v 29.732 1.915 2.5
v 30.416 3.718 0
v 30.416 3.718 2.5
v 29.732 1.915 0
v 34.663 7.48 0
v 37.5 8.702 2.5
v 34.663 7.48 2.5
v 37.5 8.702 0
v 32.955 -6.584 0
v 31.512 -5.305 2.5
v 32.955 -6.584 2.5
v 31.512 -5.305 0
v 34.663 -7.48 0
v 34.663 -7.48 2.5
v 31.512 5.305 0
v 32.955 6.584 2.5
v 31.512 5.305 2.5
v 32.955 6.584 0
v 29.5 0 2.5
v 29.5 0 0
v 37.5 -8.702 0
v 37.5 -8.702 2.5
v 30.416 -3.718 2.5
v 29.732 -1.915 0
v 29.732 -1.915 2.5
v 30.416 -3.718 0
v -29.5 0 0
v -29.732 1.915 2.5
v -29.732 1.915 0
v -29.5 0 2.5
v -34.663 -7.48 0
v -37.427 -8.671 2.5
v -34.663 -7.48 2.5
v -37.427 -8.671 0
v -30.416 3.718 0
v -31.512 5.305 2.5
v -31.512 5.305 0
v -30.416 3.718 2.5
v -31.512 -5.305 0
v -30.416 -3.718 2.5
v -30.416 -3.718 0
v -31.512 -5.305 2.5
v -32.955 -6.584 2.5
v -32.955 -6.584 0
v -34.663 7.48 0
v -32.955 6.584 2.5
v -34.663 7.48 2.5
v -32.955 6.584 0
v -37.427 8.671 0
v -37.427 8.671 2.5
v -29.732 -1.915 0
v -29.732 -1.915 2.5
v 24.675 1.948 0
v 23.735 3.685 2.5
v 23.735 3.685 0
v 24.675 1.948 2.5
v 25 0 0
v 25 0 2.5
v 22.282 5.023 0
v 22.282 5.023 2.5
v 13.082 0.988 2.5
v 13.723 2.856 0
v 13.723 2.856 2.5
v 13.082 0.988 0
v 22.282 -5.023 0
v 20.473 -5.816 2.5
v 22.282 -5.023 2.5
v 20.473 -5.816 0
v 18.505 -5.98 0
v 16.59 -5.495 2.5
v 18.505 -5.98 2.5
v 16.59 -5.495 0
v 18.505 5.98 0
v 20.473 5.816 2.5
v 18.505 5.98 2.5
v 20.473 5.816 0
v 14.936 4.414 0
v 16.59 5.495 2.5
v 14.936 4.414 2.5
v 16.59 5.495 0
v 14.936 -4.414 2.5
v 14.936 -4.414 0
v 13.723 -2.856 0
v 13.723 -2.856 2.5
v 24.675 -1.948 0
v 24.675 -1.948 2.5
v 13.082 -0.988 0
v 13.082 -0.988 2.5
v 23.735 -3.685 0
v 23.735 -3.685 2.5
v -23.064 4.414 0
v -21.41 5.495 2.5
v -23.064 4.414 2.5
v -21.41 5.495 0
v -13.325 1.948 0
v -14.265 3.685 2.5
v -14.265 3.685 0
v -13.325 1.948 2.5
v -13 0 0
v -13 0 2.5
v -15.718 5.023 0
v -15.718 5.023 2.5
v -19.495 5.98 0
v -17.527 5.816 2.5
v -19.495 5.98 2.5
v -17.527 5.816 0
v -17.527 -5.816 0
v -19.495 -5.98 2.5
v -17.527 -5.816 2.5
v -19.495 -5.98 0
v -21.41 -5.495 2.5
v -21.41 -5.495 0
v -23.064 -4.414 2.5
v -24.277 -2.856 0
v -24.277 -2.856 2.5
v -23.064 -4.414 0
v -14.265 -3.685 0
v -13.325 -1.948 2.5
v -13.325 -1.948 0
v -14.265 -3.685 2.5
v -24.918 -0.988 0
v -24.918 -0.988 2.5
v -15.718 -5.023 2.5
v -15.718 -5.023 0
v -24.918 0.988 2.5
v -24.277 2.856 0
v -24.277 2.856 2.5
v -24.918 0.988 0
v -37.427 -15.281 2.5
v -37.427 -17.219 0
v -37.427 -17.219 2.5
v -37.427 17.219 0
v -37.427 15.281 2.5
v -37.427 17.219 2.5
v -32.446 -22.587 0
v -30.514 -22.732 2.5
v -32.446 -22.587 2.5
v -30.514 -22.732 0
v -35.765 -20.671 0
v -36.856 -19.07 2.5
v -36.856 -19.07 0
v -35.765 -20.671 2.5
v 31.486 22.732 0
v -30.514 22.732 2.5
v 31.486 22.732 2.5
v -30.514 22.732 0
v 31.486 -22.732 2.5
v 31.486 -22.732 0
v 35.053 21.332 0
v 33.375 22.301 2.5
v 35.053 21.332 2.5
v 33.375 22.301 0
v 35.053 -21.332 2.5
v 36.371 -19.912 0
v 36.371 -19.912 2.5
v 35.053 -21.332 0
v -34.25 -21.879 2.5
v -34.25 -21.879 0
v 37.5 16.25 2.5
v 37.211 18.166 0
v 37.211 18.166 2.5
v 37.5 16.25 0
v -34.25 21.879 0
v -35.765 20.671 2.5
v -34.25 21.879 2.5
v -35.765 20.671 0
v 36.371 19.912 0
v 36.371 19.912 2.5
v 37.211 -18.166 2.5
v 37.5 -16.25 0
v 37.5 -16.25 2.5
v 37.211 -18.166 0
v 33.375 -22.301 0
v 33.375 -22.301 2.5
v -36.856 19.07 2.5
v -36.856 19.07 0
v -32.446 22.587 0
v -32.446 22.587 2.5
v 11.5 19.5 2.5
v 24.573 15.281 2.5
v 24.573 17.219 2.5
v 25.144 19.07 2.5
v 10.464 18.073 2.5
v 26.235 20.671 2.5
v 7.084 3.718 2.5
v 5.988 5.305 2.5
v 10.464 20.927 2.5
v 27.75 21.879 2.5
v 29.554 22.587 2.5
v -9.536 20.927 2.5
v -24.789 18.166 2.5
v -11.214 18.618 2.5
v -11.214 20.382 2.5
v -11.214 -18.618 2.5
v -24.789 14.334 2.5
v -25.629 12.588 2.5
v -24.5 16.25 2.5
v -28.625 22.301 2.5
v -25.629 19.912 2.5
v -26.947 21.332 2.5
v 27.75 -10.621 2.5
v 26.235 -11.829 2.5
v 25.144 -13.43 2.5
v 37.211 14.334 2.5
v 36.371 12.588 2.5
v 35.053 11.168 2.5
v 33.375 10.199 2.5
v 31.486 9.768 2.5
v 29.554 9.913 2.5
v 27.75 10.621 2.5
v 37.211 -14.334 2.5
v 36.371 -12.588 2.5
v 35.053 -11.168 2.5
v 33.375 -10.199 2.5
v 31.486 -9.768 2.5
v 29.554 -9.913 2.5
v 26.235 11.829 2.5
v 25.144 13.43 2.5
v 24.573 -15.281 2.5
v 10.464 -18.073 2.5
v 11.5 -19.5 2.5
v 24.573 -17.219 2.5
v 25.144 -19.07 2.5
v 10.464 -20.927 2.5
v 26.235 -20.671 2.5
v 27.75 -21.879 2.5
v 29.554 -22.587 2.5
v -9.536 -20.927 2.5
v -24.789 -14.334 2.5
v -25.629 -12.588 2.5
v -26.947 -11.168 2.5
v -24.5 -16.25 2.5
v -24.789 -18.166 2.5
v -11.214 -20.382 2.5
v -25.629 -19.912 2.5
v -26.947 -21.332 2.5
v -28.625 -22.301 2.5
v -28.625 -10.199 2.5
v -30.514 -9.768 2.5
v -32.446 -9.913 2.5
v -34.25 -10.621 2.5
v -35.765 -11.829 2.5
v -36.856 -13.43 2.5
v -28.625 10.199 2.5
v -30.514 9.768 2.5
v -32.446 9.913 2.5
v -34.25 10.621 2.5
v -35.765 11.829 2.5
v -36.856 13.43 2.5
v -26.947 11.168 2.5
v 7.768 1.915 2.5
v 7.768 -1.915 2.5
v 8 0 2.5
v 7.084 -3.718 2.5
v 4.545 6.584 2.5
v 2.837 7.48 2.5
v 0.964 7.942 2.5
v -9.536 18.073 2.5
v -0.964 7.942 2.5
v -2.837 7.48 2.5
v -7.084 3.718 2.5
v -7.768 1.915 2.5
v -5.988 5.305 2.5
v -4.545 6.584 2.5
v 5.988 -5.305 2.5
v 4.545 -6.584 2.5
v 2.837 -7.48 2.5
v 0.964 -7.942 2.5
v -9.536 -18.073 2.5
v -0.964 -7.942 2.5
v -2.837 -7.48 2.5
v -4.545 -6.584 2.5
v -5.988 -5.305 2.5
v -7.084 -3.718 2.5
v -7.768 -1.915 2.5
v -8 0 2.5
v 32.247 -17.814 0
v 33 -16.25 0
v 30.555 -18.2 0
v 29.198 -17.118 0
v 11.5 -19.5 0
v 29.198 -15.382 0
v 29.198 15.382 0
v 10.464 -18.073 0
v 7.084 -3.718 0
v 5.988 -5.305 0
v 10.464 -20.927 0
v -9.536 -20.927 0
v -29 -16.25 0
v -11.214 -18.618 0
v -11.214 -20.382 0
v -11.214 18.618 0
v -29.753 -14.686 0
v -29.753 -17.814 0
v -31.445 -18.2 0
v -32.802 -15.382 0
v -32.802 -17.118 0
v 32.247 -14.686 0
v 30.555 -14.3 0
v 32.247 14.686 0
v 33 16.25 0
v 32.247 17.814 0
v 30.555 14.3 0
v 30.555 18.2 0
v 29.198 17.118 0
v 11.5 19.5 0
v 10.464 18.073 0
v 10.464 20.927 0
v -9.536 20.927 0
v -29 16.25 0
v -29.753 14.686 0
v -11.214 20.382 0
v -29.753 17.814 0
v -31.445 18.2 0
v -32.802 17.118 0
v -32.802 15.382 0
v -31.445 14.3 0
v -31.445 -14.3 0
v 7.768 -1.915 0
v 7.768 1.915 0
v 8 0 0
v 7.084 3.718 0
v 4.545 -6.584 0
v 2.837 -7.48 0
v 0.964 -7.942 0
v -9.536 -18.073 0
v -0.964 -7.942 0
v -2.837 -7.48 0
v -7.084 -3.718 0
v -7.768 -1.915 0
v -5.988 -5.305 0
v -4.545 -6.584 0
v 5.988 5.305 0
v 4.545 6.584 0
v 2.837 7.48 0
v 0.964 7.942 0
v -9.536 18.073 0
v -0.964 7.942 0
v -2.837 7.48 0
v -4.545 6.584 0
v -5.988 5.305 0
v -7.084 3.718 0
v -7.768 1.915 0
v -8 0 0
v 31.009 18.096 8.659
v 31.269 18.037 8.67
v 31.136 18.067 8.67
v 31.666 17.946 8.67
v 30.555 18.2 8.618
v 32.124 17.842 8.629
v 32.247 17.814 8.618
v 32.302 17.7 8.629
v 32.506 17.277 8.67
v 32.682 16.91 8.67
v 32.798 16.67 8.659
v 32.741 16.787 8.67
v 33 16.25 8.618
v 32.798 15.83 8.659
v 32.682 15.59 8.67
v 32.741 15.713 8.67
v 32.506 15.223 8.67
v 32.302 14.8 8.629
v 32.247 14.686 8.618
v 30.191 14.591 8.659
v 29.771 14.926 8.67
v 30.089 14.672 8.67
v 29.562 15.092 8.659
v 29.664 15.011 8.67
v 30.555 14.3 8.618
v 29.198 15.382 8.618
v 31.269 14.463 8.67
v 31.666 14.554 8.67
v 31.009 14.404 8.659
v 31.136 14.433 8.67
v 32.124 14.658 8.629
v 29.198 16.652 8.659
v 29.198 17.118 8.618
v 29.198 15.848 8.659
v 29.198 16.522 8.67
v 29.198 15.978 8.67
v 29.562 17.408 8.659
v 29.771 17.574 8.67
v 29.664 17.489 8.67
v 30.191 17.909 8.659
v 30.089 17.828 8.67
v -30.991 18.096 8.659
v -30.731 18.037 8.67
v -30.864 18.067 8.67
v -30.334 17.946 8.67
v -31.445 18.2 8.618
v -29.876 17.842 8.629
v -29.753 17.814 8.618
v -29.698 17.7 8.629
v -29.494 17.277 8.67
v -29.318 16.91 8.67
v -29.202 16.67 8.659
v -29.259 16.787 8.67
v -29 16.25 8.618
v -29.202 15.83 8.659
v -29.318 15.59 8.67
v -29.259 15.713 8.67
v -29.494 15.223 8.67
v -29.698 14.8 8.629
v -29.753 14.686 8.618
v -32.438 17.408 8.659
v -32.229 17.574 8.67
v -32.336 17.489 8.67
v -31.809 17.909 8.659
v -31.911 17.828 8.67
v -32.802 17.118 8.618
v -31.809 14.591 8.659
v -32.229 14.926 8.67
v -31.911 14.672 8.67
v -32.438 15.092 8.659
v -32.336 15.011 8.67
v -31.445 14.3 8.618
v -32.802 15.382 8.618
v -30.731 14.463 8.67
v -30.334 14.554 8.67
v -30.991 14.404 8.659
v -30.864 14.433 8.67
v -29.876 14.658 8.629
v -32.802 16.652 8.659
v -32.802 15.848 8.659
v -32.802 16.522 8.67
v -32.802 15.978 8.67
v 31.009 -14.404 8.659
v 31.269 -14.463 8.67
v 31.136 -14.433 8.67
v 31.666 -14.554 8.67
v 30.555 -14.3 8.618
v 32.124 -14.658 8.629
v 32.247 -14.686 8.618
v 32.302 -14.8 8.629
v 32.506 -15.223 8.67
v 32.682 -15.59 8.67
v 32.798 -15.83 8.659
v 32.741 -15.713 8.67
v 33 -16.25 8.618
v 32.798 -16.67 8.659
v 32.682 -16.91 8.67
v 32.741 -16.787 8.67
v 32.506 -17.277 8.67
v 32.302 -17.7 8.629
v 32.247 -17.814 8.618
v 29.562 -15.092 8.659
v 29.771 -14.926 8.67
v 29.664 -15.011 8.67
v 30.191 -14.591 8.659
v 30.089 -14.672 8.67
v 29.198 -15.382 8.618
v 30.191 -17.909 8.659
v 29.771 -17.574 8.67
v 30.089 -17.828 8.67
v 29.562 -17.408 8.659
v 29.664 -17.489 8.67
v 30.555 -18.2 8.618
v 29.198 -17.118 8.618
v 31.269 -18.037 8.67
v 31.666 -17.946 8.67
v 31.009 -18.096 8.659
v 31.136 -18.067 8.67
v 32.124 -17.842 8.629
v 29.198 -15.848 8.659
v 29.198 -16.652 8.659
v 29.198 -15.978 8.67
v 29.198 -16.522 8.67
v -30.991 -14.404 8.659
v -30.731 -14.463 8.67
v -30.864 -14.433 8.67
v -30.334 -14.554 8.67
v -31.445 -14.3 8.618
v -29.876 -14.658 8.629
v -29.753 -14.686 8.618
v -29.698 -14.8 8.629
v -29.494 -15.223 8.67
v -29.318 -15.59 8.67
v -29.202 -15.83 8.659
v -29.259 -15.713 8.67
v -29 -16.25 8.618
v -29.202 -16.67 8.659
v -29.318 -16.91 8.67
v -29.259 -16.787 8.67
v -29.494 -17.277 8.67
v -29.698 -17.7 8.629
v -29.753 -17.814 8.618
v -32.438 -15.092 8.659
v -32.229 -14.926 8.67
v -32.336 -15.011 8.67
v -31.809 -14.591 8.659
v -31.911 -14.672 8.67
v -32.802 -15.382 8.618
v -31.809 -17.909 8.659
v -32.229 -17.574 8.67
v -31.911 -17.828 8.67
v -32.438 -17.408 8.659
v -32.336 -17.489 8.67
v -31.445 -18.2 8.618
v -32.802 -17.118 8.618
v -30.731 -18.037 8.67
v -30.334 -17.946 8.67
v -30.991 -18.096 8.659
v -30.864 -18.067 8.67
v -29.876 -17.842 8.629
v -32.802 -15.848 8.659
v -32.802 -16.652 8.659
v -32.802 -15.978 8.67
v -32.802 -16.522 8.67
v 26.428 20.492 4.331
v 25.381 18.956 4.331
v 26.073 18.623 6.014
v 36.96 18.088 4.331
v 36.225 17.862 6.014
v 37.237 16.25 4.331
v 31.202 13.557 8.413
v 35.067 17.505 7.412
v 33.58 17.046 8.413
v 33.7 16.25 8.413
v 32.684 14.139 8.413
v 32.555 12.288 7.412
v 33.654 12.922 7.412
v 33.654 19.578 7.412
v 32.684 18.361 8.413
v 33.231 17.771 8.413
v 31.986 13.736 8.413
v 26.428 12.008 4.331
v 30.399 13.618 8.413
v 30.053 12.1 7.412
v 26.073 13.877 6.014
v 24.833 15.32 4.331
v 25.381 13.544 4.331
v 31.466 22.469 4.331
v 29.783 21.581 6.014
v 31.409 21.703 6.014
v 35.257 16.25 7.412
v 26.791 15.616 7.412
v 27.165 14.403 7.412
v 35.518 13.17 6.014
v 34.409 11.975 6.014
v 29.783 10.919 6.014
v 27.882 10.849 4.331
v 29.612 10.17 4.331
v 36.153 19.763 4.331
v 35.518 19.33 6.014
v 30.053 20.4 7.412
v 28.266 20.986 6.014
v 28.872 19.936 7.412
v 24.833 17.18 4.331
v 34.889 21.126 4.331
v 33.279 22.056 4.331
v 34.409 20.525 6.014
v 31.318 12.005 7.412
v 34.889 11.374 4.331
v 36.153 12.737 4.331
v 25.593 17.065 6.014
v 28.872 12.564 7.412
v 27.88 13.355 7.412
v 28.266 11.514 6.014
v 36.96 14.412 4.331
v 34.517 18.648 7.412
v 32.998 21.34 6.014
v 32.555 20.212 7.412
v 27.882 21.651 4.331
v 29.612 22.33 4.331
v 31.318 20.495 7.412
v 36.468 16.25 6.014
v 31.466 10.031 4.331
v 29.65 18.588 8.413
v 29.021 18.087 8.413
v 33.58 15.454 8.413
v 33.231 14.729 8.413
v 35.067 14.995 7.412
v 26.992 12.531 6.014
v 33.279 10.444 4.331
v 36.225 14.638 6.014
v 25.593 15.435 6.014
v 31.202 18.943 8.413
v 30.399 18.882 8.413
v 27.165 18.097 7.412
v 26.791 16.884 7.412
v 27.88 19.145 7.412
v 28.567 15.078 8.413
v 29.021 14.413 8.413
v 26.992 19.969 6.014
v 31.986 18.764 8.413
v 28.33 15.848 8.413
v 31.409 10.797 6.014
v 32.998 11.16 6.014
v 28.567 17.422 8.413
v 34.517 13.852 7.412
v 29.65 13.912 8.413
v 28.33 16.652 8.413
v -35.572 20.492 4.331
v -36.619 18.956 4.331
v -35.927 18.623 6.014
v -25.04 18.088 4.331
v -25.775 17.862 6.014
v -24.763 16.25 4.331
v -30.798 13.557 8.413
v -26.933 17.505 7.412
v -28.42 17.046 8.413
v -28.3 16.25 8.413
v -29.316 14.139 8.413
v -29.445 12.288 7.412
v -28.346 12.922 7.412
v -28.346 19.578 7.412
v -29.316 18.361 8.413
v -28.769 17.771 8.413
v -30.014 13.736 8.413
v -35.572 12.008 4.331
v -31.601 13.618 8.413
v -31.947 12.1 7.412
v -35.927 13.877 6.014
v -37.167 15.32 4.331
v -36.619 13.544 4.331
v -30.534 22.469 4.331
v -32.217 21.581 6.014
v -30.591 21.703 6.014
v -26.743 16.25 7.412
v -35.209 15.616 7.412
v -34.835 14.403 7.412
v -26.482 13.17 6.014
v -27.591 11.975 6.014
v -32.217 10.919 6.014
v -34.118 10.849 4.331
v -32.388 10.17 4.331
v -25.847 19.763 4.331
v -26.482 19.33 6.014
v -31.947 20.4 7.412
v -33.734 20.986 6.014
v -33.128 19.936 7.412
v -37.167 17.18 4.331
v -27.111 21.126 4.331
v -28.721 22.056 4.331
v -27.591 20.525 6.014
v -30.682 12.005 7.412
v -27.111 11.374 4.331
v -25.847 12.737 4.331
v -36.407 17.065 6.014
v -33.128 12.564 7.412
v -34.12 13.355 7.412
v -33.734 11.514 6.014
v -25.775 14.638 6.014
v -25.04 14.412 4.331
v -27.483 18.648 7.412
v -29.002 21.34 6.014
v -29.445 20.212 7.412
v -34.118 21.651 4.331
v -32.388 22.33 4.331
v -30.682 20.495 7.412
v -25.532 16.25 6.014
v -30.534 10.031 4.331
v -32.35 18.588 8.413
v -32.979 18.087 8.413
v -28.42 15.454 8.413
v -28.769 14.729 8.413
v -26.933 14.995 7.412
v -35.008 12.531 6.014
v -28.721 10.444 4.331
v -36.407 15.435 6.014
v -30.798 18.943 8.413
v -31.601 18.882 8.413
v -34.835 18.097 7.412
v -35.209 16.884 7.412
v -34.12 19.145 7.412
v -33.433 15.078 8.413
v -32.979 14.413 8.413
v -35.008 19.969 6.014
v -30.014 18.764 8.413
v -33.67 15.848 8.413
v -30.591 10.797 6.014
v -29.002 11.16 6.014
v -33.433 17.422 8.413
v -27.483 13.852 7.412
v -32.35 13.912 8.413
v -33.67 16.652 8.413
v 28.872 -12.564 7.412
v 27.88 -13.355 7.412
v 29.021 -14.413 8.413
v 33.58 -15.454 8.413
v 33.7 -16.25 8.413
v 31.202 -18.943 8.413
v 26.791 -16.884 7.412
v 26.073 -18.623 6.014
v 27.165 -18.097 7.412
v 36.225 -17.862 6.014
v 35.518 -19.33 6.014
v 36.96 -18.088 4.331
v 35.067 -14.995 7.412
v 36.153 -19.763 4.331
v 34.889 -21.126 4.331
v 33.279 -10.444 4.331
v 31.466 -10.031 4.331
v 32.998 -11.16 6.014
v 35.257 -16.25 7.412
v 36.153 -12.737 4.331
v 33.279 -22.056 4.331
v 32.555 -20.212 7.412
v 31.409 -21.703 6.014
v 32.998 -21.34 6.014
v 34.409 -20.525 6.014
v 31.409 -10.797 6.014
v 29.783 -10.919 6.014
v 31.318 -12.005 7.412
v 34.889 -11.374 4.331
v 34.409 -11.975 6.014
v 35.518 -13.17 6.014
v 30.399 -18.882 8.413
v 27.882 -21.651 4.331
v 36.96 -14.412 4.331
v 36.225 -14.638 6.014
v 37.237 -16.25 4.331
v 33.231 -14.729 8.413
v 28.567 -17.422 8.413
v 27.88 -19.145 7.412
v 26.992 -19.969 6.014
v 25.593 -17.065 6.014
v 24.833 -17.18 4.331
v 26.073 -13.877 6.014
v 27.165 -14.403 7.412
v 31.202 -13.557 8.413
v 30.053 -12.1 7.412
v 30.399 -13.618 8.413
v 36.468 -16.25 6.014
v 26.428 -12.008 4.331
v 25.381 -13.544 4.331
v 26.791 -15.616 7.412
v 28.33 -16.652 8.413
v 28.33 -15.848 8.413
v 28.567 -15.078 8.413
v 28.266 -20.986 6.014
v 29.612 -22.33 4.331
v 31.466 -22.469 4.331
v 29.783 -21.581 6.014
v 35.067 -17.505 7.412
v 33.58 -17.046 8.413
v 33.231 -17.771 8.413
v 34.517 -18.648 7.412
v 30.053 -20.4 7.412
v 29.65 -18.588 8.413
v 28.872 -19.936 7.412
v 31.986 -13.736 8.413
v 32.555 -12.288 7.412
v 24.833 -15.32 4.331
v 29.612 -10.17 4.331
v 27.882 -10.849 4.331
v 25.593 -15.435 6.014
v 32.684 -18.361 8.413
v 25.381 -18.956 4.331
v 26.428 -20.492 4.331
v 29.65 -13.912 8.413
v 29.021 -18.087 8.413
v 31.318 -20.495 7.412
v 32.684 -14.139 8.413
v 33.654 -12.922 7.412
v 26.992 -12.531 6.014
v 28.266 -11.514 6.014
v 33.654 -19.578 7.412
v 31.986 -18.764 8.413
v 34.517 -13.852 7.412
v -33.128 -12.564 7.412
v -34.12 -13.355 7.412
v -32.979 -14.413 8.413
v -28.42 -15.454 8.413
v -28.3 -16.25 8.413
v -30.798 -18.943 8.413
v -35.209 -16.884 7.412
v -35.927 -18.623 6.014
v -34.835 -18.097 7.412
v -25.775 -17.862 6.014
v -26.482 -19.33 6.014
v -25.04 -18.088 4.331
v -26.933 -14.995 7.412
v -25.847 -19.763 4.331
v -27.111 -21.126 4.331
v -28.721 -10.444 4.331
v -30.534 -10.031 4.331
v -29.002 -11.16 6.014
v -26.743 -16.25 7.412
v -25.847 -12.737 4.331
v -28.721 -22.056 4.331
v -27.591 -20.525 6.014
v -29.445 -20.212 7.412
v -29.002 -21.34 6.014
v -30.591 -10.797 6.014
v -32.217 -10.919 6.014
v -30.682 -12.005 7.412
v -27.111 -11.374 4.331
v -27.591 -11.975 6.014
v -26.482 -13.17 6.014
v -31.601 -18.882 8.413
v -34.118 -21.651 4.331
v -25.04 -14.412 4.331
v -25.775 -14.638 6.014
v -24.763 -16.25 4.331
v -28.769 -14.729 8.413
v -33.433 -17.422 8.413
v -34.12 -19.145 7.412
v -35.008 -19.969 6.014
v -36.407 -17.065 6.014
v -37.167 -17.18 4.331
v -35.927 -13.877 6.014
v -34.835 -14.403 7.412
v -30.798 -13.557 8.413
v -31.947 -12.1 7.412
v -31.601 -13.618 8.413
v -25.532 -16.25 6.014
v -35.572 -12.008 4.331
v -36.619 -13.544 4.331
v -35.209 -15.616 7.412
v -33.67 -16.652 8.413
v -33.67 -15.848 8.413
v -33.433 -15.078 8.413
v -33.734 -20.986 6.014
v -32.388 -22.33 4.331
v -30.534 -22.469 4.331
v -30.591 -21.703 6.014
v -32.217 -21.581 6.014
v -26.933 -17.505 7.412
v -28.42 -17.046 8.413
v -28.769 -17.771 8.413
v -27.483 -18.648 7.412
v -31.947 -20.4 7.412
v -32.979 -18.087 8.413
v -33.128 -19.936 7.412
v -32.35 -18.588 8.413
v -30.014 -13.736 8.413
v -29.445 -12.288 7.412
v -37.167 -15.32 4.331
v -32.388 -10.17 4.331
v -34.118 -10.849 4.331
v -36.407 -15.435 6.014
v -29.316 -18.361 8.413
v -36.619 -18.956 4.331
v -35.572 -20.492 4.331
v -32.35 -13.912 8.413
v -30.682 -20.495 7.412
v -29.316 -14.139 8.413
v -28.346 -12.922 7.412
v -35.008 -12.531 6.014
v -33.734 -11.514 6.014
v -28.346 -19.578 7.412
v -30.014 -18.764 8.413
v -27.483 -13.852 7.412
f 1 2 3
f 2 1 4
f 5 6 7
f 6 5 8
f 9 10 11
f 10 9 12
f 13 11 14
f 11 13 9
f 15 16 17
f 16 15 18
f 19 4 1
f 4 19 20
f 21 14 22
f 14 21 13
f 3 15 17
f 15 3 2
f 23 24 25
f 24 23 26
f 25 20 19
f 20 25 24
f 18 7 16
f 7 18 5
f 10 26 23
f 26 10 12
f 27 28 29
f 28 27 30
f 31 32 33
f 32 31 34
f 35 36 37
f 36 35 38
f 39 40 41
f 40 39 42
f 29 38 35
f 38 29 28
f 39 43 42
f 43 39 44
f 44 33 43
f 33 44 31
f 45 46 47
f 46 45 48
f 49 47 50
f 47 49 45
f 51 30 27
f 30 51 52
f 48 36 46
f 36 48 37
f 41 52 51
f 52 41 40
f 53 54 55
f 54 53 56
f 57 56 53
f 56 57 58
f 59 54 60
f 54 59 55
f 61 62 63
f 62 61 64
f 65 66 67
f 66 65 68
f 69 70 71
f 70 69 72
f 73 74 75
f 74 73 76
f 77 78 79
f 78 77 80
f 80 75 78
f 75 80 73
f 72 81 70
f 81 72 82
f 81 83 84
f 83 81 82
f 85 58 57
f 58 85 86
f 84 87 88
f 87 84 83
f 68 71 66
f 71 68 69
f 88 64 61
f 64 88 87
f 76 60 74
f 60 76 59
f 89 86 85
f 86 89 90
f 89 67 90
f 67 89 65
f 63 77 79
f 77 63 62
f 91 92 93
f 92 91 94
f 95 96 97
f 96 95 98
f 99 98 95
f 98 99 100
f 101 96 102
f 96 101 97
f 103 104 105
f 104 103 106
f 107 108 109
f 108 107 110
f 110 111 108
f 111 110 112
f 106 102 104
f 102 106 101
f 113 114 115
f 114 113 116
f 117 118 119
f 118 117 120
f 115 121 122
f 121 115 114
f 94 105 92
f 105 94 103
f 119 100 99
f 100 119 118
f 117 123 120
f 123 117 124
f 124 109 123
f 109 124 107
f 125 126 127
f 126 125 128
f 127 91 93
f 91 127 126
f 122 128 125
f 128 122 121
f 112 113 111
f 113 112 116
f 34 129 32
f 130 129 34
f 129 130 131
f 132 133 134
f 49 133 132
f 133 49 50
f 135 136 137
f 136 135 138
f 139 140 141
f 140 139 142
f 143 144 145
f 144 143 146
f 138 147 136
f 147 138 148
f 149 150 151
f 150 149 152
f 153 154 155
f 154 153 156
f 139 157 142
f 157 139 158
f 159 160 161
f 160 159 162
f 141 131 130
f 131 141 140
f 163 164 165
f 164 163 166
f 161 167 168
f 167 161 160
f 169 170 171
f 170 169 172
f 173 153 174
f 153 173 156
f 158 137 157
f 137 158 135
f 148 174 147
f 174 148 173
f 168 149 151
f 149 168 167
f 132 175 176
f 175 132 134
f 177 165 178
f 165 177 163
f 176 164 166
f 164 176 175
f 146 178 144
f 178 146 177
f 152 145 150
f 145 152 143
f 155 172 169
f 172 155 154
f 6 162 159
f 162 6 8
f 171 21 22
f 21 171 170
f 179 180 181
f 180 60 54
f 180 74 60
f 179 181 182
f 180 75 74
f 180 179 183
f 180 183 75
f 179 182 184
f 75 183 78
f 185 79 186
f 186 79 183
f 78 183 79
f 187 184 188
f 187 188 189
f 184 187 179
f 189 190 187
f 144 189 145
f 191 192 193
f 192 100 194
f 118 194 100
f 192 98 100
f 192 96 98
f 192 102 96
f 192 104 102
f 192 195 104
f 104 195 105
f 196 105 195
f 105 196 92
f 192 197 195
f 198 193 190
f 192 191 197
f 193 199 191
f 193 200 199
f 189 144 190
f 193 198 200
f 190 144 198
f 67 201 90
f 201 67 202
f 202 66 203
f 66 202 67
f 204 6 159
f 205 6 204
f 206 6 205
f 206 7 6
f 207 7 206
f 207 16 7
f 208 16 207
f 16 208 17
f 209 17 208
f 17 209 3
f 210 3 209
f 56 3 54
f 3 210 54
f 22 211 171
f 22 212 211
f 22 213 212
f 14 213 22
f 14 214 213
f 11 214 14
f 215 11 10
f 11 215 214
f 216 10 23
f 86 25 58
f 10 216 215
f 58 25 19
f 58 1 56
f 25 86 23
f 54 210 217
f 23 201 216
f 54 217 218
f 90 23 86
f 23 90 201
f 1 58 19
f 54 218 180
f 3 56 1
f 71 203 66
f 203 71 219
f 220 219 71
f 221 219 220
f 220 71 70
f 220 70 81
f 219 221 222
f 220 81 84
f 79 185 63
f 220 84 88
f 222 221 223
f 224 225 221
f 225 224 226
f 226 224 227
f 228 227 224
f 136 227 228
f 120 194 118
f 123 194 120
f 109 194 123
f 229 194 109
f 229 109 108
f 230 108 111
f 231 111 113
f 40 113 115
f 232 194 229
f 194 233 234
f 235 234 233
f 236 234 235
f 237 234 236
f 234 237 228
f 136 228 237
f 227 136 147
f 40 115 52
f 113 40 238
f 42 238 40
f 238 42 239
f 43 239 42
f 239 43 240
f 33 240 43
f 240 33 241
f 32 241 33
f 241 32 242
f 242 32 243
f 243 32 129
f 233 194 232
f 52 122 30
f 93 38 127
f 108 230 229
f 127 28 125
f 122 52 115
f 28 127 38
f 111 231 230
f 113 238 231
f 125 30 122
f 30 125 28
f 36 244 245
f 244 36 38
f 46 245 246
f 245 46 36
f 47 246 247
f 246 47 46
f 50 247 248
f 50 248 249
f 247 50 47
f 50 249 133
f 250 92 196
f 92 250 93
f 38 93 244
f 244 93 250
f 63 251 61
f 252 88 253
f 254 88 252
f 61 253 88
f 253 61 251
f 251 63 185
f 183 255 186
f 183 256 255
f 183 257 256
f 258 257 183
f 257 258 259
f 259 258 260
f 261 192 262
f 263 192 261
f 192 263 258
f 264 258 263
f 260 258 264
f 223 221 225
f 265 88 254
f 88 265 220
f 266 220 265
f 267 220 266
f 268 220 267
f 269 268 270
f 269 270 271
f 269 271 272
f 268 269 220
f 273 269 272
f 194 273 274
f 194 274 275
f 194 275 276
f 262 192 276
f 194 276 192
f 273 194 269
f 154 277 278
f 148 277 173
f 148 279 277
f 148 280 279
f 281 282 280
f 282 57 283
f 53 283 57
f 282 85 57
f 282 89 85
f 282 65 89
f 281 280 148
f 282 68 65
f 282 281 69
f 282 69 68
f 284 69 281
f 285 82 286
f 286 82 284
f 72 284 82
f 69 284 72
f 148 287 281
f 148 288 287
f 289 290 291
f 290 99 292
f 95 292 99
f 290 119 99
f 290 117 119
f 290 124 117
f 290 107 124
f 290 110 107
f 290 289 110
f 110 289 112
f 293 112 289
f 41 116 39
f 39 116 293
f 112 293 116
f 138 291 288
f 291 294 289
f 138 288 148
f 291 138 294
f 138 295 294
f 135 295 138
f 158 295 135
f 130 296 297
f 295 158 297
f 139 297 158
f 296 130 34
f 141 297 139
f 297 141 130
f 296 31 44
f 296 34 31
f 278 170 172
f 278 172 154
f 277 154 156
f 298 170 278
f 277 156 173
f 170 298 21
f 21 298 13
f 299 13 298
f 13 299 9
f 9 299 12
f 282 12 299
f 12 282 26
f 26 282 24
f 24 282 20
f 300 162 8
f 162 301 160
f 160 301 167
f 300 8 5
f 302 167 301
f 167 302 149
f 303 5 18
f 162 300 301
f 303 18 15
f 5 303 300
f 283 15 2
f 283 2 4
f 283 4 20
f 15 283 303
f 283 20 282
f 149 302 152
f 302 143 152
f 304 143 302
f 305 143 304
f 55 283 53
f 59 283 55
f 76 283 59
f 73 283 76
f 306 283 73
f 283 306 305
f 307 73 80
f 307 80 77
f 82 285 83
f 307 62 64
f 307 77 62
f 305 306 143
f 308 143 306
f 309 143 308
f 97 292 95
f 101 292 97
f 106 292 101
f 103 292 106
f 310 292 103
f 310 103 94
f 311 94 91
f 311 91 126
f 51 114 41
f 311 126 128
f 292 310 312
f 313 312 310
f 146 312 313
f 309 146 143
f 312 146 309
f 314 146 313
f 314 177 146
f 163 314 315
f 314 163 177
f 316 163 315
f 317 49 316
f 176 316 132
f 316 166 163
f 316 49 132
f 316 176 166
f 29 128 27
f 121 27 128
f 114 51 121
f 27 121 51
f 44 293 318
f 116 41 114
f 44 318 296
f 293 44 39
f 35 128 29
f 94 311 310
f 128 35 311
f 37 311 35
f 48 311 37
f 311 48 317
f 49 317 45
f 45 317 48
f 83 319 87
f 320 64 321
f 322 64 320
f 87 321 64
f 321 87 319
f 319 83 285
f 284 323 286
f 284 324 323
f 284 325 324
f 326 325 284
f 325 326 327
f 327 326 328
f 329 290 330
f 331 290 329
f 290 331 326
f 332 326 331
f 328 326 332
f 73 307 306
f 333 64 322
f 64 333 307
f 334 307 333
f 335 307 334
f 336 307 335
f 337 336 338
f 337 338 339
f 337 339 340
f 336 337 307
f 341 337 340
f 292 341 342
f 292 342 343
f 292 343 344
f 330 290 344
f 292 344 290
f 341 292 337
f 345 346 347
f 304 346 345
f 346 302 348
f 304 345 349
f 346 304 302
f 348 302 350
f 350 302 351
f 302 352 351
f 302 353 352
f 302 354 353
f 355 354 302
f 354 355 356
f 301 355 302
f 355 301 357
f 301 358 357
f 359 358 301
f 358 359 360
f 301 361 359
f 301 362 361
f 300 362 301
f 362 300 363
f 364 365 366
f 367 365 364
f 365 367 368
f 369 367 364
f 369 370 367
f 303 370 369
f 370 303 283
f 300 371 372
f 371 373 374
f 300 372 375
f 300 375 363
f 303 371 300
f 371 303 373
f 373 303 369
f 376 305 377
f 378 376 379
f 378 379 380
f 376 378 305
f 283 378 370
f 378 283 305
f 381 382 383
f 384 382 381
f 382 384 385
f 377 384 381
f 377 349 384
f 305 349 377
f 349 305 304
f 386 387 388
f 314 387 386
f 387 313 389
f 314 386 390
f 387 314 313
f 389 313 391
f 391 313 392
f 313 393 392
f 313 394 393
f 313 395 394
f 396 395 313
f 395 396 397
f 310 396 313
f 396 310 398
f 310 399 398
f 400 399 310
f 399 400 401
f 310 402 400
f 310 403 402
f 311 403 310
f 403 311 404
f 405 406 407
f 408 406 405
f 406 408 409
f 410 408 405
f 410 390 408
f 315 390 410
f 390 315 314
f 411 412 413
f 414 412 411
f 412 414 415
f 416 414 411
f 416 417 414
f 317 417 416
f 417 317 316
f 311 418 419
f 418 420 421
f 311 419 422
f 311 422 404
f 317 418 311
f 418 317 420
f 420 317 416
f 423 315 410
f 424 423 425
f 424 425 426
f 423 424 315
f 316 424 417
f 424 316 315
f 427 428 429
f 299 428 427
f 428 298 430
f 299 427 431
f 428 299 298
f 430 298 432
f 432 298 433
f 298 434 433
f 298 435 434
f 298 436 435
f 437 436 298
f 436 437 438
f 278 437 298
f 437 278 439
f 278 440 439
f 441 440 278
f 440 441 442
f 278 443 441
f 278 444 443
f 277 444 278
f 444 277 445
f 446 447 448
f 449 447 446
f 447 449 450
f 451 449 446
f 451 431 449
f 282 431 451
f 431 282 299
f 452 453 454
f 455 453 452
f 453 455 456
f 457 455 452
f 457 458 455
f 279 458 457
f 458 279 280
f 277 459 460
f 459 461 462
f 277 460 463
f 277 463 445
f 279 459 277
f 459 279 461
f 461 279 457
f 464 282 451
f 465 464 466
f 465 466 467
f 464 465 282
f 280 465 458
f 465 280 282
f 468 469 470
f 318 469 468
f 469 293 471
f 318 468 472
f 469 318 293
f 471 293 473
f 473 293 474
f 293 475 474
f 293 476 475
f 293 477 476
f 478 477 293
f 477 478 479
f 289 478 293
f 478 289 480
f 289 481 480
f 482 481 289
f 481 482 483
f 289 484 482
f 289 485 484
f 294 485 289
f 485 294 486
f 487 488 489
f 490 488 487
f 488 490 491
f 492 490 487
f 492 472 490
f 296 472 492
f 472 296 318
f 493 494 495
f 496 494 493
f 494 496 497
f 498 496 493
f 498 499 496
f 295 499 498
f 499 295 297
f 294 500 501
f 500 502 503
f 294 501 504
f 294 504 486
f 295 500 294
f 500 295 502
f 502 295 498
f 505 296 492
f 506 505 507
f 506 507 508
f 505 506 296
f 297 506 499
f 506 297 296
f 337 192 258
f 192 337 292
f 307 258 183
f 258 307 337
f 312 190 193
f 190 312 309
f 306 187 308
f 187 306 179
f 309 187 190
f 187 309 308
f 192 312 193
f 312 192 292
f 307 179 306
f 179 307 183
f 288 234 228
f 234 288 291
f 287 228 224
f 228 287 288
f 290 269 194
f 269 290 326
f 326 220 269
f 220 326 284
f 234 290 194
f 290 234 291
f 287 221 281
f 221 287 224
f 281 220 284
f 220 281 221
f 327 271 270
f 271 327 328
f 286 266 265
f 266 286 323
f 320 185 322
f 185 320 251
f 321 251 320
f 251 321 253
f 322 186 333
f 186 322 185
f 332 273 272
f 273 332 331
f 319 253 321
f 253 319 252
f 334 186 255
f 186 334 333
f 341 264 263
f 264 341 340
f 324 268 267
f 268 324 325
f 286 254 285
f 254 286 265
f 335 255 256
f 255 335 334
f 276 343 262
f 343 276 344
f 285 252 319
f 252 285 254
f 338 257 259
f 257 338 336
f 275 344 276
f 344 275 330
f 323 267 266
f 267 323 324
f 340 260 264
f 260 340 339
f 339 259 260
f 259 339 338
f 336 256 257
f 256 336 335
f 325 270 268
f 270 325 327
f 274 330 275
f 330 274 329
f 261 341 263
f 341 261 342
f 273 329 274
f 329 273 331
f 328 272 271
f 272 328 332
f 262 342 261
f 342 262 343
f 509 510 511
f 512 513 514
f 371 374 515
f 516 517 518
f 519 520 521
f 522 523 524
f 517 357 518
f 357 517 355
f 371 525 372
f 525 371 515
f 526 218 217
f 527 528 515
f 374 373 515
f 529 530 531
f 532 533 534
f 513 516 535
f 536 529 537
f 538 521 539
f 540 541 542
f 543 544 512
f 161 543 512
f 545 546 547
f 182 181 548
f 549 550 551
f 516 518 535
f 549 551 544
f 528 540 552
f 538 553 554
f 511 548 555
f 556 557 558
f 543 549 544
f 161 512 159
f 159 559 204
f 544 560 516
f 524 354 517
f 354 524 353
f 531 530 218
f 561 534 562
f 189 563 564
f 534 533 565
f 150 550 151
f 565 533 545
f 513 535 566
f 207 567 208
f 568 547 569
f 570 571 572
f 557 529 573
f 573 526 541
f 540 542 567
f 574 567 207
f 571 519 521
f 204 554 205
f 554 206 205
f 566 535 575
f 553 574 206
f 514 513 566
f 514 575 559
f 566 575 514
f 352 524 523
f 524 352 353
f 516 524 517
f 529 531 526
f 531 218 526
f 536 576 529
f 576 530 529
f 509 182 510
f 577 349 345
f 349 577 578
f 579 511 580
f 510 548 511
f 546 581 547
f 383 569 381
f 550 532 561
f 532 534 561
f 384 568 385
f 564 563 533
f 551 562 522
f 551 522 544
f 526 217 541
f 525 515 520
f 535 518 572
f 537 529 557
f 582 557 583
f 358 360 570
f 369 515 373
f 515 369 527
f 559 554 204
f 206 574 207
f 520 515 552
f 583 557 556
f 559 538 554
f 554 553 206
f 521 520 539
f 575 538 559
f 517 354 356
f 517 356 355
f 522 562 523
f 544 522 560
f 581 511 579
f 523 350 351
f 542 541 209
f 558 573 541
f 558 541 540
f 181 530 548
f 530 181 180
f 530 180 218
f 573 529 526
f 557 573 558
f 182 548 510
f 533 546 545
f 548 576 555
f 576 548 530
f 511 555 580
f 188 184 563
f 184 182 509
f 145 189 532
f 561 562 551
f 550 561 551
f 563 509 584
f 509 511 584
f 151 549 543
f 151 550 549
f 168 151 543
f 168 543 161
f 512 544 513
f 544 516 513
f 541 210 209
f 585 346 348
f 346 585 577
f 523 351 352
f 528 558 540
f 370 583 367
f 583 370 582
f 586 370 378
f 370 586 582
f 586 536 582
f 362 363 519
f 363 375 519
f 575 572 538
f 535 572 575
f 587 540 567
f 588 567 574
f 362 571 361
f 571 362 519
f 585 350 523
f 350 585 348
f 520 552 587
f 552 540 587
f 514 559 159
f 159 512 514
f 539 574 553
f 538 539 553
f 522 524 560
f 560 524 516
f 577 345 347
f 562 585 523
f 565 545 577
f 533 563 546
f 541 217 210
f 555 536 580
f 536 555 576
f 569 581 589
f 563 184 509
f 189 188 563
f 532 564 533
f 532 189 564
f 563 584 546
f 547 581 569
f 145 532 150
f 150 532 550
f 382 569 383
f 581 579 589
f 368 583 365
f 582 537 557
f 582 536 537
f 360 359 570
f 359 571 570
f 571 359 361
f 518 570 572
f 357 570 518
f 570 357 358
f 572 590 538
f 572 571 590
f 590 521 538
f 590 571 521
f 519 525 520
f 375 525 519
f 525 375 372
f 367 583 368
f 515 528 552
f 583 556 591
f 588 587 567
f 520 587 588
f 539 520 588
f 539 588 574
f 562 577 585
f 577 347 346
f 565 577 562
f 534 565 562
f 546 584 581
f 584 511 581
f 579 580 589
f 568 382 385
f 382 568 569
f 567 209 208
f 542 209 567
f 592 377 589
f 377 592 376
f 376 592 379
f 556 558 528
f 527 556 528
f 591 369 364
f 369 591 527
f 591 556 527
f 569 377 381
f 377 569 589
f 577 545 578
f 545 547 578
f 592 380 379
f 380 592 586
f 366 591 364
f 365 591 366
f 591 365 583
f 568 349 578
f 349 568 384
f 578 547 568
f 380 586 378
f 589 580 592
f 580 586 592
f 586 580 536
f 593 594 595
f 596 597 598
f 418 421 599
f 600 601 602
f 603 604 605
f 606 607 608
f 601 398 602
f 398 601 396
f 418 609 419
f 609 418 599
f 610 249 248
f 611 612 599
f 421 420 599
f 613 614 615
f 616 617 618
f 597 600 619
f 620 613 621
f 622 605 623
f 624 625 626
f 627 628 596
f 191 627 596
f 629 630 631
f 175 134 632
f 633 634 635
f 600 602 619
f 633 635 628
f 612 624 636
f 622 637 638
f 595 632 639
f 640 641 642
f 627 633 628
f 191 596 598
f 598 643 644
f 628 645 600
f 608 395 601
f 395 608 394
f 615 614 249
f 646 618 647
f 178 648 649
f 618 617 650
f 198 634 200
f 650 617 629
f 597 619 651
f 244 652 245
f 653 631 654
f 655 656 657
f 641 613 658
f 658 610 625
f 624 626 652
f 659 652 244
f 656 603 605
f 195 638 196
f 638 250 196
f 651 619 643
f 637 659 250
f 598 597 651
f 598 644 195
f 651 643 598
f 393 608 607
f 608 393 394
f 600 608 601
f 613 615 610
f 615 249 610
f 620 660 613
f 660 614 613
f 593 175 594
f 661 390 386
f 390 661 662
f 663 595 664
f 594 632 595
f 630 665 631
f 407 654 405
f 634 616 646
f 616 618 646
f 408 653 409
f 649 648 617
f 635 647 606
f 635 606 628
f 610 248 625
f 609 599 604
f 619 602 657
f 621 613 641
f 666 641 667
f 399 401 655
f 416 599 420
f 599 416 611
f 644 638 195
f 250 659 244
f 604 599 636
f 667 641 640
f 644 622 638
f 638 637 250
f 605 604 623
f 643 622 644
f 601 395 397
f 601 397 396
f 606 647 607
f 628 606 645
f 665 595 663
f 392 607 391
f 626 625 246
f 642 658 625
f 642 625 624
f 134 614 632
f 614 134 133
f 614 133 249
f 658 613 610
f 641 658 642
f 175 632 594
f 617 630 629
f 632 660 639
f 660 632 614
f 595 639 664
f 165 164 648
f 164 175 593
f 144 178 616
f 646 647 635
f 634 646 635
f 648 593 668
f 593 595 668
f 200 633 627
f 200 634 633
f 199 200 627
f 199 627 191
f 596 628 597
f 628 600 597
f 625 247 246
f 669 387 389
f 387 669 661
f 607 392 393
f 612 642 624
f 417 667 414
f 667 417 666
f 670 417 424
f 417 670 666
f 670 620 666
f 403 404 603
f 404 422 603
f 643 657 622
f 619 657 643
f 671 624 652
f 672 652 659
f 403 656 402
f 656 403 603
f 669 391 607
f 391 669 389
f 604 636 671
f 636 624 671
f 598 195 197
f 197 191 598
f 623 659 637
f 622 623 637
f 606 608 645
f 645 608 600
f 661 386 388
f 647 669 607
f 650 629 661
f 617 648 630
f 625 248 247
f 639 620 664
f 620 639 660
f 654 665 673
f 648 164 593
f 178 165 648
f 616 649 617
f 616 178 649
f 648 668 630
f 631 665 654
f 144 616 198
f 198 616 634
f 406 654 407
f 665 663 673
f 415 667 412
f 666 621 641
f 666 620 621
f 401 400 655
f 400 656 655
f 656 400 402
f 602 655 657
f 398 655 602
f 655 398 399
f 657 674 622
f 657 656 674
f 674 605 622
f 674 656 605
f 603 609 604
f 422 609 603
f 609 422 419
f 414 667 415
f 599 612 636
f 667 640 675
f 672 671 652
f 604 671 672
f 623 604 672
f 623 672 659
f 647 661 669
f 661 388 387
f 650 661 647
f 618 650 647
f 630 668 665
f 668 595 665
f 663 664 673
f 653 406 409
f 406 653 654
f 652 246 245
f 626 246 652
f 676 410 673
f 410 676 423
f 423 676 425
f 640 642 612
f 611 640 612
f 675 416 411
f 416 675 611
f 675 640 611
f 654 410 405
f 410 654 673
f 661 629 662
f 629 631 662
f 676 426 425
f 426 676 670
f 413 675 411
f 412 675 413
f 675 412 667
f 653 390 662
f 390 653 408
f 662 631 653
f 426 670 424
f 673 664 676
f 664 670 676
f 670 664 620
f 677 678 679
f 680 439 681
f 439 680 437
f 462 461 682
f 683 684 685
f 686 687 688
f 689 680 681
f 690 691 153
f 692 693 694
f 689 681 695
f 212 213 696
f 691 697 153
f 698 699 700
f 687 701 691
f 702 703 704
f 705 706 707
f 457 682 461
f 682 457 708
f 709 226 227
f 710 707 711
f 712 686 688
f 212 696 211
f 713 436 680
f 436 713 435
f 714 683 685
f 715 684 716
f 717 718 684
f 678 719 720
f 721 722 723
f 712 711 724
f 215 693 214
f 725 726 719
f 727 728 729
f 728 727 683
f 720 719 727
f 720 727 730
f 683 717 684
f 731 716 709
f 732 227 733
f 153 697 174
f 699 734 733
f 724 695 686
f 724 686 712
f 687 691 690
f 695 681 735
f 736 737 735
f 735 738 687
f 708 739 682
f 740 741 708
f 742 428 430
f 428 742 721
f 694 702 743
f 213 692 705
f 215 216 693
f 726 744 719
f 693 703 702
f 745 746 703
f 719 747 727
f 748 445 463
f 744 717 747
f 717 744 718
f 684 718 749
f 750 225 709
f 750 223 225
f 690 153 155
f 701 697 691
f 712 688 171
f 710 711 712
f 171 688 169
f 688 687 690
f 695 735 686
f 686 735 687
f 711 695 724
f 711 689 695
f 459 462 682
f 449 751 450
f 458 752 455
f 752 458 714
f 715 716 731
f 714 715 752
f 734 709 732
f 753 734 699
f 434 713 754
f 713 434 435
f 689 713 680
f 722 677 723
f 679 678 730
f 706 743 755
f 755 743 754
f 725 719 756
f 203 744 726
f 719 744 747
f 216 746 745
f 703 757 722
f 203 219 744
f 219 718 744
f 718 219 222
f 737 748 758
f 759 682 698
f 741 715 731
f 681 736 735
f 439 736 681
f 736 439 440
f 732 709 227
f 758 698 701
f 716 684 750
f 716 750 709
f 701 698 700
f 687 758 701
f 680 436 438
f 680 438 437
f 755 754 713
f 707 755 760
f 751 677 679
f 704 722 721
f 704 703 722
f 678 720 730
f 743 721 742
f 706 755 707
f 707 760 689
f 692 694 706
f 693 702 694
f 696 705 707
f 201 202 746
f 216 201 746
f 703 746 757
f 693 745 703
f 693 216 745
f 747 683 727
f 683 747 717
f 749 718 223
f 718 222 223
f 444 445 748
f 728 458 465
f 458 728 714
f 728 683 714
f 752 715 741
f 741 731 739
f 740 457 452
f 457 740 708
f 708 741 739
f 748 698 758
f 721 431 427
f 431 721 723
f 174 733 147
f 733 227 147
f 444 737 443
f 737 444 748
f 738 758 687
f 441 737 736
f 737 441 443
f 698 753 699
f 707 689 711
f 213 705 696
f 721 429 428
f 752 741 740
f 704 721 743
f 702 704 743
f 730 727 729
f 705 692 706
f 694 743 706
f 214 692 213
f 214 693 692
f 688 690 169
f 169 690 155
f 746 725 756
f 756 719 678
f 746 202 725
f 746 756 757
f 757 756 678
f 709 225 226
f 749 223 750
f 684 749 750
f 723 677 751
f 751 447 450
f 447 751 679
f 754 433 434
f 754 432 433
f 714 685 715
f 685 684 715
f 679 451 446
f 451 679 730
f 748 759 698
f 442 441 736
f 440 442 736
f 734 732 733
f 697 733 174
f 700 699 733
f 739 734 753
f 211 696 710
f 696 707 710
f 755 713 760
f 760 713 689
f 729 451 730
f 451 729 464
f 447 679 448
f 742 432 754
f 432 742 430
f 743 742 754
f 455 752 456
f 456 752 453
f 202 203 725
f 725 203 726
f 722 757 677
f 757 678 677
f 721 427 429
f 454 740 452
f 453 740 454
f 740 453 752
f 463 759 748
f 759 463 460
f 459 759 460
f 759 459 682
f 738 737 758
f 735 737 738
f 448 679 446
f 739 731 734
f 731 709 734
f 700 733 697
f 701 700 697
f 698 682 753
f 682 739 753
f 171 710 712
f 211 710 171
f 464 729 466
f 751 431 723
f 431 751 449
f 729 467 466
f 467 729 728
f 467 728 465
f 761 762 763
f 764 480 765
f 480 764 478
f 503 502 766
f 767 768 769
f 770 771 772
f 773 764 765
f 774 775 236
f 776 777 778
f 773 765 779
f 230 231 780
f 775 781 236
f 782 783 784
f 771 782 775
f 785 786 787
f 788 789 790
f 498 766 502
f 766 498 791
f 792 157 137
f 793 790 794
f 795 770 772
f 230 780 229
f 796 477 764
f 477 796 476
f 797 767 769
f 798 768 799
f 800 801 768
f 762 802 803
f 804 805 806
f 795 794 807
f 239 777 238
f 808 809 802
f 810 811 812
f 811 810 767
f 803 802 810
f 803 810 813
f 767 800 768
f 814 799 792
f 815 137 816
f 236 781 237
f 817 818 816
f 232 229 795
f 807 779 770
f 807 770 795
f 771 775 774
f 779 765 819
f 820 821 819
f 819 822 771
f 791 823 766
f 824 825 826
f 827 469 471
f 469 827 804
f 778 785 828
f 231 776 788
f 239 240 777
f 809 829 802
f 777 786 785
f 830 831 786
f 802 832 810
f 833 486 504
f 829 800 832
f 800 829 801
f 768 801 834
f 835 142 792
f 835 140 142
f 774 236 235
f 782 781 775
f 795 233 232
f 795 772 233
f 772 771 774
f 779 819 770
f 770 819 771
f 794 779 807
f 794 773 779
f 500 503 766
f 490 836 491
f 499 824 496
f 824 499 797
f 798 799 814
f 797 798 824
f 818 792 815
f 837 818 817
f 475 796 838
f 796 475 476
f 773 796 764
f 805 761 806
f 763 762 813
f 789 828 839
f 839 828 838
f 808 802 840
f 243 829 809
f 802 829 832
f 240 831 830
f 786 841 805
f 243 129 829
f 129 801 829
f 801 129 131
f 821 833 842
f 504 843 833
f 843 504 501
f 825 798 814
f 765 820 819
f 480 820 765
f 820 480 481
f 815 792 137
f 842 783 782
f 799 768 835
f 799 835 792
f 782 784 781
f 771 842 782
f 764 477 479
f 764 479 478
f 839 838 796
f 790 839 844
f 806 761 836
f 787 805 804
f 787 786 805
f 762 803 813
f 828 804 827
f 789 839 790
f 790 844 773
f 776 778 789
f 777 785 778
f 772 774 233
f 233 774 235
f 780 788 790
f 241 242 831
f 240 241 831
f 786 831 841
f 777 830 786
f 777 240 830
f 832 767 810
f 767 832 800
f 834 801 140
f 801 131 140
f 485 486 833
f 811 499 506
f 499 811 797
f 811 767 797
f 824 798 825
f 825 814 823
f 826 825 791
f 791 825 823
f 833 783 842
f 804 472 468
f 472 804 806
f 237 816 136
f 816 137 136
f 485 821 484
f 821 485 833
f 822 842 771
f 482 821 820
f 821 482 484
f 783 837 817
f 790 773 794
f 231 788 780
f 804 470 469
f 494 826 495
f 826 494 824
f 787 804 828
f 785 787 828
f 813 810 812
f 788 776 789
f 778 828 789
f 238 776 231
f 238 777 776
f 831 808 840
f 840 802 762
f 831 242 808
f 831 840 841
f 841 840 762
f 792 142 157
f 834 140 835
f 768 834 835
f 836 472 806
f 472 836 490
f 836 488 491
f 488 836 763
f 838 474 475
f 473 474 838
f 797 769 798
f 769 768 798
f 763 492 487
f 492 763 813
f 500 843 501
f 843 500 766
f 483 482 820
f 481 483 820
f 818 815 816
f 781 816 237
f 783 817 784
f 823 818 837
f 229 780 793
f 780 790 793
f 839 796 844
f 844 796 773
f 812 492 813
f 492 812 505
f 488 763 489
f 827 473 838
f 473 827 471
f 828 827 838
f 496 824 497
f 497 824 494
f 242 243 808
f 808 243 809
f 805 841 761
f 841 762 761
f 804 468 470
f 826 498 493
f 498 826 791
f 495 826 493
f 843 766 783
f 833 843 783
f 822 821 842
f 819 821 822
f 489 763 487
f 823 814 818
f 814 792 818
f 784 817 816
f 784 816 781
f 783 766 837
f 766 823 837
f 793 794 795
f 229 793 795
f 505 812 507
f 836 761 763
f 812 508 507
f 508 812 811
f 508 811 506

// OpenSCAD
//#import("lipo-protector.stl");

//size of battery
width=35;
length=75;


//base plate
difference(){
hull(){
translate([(length/2)-6.5,width/2-1.25,0])  cylinder(2.5,6.5,6.5);
translate([(-length/2)+6.5,width/2-1.25,0]) cylinder(2.5,6.5,6.5);
translate([(length/2)-6.5,-width/2+1.25,0]) cylinder(2.5,6.5,6.5);
translate([(-length/2)+6.5,-width/2+1.25,0]) cylinder(2.5,6.5,6.5); 
}
//grub holes
translate([(length/2)-6.5,width/2-1.25,-10]) cylinder(20,2,2);  
translate([(-length/2)+6.5,width/2-1.25,-10]) cylinder(20,2,2); 
translate([(length/2)-6.5,-width/2+1.25,-10]) cylinder(20,2,2);
translate([(-length/2)+6.5,-width/2+1.25,-10]) cylinder(20,2,2);

//strap holes
hull(){
translate([10,width/2+2,-0.1]) cylinder(10,1.5,1.5);
translate([-10,width/2+2,-0.1]) cylinder(10,1.5,1.5);
}
hull(){
translate([10,-width/2-2,-0.1]) cylinder(10,1.5,1.5);
translate([-10,-width/2-2,-0.1]) cylinder(10,1.5,1.5);
}



//outer cuts - /weight saving
if (length >=80){
    hull(){
    translate([(((10/2)+2 + length/2)-6.5)/2,-width/2-4,-0.1]) cylinder(10,6,6);
    translate([(((10/2)+2 + length/2)-6.5)/2,-width/2-10,-0.1]) cylinder(10,9,9);
    }
    hull(){
    translate([(((10/2)+2 + length/2)-6.5)/2,width/2+4,-0.1]) cylinder(10,6,6);
    translate([(((10/2)+2 + length/2)-6.5)/2,width/2+10,-0.1]) cylinder(10,9,9);
    }
    hull(){
    translate([-(((10/2)+2 + length/2)-6.5)/2,-width/2-4,-0.1]) cylinder(10,6,6);
    translate([-(((10/2)+2 + length/2)-6.5)/2,-width/2-10,-0.1]) cylinder(10,9,9);
    }
    hull(){
    translate([-(((10/2)+2 + length/2)-6.5)/2,width/2+4,-0.1]) cylinder(10,6,6);
    translate([-(((10/2)+2 + length/2)-6.5)/2,width/2+10,-0.1]) cylinder(10,9,9);
    }
}

if (width >=30){
hull(){
translate([length/2,0,-0.1]) cylinder(10,8,8);
translate([length/2+10,0,-0.1]) cylinder(10,12,12);
}
hull(){
translate([-length/2,0,-0.1]) cylinder(10,8,8);
translate([-length/2-10,0,-0.1]) cylinder(10,12,12);
}
}

//inner cuts - weight saving
if (width >=30 && length >=65){
translate([(((10/2)+2 + length/2)-6.5)/2,0,-0.1]) cylinder(10,6,6);
translate([-(((10/2)+2 + length/2)-6.5)/2,0,-0.1]) cylinder(10,6,6);
}

if (width >=30 && length >=50){
translate([0,0,-0.1]) cylinder(10,8,8);
} else {
translate([0,0,-0.1]) cylinder(10,6,6);    
}    

}






//grubs & holes
difference(){
translate([(length/2)-6.5,width/2-1.25,2.5]) sphere(6.5);
translate([(length/2)-6.5,width/2-1.25,-10]) cylinder(10,6.5,6.5);
translate([(length/2)-6.5,width/2-1.25,-10]) cylinder(20,2,2);    
}
difference(){
translate([(-length/2)+6.5,width/2-1.25,2.5]) sphere(6.5);
translate([(-length/2)+6.5,width/2-1.25,-10]) cylinder(10,6.5,6.5);
translate([(-length/2)+6.5,width/2-1.25,-10]) cylinder(20,2,2);   
} 
difference(){
translate([(length/2)-6.5,-width/2+1.25,2.5]) sphere(6.5);
translate([(length/2)-6.5,-width/2+1.25,-10]) cylinder(10,6.5,6.5);
translate([(length/2)-6.5,-width/2+1.25,-10]) cylinder(20,2,2); 
}
difference(){
translate([(-length/2)+6.5,-width/2+1.25,2.5]) sphere(6.5);
translate([(-length/2)+6.5,-width/2+1.25,-10]) cylinder(10,6.5,6.5);   
translate([(-length/2)+6.5,-width/2+1.25,-10]) cylinder(20,2,2); 
}    
